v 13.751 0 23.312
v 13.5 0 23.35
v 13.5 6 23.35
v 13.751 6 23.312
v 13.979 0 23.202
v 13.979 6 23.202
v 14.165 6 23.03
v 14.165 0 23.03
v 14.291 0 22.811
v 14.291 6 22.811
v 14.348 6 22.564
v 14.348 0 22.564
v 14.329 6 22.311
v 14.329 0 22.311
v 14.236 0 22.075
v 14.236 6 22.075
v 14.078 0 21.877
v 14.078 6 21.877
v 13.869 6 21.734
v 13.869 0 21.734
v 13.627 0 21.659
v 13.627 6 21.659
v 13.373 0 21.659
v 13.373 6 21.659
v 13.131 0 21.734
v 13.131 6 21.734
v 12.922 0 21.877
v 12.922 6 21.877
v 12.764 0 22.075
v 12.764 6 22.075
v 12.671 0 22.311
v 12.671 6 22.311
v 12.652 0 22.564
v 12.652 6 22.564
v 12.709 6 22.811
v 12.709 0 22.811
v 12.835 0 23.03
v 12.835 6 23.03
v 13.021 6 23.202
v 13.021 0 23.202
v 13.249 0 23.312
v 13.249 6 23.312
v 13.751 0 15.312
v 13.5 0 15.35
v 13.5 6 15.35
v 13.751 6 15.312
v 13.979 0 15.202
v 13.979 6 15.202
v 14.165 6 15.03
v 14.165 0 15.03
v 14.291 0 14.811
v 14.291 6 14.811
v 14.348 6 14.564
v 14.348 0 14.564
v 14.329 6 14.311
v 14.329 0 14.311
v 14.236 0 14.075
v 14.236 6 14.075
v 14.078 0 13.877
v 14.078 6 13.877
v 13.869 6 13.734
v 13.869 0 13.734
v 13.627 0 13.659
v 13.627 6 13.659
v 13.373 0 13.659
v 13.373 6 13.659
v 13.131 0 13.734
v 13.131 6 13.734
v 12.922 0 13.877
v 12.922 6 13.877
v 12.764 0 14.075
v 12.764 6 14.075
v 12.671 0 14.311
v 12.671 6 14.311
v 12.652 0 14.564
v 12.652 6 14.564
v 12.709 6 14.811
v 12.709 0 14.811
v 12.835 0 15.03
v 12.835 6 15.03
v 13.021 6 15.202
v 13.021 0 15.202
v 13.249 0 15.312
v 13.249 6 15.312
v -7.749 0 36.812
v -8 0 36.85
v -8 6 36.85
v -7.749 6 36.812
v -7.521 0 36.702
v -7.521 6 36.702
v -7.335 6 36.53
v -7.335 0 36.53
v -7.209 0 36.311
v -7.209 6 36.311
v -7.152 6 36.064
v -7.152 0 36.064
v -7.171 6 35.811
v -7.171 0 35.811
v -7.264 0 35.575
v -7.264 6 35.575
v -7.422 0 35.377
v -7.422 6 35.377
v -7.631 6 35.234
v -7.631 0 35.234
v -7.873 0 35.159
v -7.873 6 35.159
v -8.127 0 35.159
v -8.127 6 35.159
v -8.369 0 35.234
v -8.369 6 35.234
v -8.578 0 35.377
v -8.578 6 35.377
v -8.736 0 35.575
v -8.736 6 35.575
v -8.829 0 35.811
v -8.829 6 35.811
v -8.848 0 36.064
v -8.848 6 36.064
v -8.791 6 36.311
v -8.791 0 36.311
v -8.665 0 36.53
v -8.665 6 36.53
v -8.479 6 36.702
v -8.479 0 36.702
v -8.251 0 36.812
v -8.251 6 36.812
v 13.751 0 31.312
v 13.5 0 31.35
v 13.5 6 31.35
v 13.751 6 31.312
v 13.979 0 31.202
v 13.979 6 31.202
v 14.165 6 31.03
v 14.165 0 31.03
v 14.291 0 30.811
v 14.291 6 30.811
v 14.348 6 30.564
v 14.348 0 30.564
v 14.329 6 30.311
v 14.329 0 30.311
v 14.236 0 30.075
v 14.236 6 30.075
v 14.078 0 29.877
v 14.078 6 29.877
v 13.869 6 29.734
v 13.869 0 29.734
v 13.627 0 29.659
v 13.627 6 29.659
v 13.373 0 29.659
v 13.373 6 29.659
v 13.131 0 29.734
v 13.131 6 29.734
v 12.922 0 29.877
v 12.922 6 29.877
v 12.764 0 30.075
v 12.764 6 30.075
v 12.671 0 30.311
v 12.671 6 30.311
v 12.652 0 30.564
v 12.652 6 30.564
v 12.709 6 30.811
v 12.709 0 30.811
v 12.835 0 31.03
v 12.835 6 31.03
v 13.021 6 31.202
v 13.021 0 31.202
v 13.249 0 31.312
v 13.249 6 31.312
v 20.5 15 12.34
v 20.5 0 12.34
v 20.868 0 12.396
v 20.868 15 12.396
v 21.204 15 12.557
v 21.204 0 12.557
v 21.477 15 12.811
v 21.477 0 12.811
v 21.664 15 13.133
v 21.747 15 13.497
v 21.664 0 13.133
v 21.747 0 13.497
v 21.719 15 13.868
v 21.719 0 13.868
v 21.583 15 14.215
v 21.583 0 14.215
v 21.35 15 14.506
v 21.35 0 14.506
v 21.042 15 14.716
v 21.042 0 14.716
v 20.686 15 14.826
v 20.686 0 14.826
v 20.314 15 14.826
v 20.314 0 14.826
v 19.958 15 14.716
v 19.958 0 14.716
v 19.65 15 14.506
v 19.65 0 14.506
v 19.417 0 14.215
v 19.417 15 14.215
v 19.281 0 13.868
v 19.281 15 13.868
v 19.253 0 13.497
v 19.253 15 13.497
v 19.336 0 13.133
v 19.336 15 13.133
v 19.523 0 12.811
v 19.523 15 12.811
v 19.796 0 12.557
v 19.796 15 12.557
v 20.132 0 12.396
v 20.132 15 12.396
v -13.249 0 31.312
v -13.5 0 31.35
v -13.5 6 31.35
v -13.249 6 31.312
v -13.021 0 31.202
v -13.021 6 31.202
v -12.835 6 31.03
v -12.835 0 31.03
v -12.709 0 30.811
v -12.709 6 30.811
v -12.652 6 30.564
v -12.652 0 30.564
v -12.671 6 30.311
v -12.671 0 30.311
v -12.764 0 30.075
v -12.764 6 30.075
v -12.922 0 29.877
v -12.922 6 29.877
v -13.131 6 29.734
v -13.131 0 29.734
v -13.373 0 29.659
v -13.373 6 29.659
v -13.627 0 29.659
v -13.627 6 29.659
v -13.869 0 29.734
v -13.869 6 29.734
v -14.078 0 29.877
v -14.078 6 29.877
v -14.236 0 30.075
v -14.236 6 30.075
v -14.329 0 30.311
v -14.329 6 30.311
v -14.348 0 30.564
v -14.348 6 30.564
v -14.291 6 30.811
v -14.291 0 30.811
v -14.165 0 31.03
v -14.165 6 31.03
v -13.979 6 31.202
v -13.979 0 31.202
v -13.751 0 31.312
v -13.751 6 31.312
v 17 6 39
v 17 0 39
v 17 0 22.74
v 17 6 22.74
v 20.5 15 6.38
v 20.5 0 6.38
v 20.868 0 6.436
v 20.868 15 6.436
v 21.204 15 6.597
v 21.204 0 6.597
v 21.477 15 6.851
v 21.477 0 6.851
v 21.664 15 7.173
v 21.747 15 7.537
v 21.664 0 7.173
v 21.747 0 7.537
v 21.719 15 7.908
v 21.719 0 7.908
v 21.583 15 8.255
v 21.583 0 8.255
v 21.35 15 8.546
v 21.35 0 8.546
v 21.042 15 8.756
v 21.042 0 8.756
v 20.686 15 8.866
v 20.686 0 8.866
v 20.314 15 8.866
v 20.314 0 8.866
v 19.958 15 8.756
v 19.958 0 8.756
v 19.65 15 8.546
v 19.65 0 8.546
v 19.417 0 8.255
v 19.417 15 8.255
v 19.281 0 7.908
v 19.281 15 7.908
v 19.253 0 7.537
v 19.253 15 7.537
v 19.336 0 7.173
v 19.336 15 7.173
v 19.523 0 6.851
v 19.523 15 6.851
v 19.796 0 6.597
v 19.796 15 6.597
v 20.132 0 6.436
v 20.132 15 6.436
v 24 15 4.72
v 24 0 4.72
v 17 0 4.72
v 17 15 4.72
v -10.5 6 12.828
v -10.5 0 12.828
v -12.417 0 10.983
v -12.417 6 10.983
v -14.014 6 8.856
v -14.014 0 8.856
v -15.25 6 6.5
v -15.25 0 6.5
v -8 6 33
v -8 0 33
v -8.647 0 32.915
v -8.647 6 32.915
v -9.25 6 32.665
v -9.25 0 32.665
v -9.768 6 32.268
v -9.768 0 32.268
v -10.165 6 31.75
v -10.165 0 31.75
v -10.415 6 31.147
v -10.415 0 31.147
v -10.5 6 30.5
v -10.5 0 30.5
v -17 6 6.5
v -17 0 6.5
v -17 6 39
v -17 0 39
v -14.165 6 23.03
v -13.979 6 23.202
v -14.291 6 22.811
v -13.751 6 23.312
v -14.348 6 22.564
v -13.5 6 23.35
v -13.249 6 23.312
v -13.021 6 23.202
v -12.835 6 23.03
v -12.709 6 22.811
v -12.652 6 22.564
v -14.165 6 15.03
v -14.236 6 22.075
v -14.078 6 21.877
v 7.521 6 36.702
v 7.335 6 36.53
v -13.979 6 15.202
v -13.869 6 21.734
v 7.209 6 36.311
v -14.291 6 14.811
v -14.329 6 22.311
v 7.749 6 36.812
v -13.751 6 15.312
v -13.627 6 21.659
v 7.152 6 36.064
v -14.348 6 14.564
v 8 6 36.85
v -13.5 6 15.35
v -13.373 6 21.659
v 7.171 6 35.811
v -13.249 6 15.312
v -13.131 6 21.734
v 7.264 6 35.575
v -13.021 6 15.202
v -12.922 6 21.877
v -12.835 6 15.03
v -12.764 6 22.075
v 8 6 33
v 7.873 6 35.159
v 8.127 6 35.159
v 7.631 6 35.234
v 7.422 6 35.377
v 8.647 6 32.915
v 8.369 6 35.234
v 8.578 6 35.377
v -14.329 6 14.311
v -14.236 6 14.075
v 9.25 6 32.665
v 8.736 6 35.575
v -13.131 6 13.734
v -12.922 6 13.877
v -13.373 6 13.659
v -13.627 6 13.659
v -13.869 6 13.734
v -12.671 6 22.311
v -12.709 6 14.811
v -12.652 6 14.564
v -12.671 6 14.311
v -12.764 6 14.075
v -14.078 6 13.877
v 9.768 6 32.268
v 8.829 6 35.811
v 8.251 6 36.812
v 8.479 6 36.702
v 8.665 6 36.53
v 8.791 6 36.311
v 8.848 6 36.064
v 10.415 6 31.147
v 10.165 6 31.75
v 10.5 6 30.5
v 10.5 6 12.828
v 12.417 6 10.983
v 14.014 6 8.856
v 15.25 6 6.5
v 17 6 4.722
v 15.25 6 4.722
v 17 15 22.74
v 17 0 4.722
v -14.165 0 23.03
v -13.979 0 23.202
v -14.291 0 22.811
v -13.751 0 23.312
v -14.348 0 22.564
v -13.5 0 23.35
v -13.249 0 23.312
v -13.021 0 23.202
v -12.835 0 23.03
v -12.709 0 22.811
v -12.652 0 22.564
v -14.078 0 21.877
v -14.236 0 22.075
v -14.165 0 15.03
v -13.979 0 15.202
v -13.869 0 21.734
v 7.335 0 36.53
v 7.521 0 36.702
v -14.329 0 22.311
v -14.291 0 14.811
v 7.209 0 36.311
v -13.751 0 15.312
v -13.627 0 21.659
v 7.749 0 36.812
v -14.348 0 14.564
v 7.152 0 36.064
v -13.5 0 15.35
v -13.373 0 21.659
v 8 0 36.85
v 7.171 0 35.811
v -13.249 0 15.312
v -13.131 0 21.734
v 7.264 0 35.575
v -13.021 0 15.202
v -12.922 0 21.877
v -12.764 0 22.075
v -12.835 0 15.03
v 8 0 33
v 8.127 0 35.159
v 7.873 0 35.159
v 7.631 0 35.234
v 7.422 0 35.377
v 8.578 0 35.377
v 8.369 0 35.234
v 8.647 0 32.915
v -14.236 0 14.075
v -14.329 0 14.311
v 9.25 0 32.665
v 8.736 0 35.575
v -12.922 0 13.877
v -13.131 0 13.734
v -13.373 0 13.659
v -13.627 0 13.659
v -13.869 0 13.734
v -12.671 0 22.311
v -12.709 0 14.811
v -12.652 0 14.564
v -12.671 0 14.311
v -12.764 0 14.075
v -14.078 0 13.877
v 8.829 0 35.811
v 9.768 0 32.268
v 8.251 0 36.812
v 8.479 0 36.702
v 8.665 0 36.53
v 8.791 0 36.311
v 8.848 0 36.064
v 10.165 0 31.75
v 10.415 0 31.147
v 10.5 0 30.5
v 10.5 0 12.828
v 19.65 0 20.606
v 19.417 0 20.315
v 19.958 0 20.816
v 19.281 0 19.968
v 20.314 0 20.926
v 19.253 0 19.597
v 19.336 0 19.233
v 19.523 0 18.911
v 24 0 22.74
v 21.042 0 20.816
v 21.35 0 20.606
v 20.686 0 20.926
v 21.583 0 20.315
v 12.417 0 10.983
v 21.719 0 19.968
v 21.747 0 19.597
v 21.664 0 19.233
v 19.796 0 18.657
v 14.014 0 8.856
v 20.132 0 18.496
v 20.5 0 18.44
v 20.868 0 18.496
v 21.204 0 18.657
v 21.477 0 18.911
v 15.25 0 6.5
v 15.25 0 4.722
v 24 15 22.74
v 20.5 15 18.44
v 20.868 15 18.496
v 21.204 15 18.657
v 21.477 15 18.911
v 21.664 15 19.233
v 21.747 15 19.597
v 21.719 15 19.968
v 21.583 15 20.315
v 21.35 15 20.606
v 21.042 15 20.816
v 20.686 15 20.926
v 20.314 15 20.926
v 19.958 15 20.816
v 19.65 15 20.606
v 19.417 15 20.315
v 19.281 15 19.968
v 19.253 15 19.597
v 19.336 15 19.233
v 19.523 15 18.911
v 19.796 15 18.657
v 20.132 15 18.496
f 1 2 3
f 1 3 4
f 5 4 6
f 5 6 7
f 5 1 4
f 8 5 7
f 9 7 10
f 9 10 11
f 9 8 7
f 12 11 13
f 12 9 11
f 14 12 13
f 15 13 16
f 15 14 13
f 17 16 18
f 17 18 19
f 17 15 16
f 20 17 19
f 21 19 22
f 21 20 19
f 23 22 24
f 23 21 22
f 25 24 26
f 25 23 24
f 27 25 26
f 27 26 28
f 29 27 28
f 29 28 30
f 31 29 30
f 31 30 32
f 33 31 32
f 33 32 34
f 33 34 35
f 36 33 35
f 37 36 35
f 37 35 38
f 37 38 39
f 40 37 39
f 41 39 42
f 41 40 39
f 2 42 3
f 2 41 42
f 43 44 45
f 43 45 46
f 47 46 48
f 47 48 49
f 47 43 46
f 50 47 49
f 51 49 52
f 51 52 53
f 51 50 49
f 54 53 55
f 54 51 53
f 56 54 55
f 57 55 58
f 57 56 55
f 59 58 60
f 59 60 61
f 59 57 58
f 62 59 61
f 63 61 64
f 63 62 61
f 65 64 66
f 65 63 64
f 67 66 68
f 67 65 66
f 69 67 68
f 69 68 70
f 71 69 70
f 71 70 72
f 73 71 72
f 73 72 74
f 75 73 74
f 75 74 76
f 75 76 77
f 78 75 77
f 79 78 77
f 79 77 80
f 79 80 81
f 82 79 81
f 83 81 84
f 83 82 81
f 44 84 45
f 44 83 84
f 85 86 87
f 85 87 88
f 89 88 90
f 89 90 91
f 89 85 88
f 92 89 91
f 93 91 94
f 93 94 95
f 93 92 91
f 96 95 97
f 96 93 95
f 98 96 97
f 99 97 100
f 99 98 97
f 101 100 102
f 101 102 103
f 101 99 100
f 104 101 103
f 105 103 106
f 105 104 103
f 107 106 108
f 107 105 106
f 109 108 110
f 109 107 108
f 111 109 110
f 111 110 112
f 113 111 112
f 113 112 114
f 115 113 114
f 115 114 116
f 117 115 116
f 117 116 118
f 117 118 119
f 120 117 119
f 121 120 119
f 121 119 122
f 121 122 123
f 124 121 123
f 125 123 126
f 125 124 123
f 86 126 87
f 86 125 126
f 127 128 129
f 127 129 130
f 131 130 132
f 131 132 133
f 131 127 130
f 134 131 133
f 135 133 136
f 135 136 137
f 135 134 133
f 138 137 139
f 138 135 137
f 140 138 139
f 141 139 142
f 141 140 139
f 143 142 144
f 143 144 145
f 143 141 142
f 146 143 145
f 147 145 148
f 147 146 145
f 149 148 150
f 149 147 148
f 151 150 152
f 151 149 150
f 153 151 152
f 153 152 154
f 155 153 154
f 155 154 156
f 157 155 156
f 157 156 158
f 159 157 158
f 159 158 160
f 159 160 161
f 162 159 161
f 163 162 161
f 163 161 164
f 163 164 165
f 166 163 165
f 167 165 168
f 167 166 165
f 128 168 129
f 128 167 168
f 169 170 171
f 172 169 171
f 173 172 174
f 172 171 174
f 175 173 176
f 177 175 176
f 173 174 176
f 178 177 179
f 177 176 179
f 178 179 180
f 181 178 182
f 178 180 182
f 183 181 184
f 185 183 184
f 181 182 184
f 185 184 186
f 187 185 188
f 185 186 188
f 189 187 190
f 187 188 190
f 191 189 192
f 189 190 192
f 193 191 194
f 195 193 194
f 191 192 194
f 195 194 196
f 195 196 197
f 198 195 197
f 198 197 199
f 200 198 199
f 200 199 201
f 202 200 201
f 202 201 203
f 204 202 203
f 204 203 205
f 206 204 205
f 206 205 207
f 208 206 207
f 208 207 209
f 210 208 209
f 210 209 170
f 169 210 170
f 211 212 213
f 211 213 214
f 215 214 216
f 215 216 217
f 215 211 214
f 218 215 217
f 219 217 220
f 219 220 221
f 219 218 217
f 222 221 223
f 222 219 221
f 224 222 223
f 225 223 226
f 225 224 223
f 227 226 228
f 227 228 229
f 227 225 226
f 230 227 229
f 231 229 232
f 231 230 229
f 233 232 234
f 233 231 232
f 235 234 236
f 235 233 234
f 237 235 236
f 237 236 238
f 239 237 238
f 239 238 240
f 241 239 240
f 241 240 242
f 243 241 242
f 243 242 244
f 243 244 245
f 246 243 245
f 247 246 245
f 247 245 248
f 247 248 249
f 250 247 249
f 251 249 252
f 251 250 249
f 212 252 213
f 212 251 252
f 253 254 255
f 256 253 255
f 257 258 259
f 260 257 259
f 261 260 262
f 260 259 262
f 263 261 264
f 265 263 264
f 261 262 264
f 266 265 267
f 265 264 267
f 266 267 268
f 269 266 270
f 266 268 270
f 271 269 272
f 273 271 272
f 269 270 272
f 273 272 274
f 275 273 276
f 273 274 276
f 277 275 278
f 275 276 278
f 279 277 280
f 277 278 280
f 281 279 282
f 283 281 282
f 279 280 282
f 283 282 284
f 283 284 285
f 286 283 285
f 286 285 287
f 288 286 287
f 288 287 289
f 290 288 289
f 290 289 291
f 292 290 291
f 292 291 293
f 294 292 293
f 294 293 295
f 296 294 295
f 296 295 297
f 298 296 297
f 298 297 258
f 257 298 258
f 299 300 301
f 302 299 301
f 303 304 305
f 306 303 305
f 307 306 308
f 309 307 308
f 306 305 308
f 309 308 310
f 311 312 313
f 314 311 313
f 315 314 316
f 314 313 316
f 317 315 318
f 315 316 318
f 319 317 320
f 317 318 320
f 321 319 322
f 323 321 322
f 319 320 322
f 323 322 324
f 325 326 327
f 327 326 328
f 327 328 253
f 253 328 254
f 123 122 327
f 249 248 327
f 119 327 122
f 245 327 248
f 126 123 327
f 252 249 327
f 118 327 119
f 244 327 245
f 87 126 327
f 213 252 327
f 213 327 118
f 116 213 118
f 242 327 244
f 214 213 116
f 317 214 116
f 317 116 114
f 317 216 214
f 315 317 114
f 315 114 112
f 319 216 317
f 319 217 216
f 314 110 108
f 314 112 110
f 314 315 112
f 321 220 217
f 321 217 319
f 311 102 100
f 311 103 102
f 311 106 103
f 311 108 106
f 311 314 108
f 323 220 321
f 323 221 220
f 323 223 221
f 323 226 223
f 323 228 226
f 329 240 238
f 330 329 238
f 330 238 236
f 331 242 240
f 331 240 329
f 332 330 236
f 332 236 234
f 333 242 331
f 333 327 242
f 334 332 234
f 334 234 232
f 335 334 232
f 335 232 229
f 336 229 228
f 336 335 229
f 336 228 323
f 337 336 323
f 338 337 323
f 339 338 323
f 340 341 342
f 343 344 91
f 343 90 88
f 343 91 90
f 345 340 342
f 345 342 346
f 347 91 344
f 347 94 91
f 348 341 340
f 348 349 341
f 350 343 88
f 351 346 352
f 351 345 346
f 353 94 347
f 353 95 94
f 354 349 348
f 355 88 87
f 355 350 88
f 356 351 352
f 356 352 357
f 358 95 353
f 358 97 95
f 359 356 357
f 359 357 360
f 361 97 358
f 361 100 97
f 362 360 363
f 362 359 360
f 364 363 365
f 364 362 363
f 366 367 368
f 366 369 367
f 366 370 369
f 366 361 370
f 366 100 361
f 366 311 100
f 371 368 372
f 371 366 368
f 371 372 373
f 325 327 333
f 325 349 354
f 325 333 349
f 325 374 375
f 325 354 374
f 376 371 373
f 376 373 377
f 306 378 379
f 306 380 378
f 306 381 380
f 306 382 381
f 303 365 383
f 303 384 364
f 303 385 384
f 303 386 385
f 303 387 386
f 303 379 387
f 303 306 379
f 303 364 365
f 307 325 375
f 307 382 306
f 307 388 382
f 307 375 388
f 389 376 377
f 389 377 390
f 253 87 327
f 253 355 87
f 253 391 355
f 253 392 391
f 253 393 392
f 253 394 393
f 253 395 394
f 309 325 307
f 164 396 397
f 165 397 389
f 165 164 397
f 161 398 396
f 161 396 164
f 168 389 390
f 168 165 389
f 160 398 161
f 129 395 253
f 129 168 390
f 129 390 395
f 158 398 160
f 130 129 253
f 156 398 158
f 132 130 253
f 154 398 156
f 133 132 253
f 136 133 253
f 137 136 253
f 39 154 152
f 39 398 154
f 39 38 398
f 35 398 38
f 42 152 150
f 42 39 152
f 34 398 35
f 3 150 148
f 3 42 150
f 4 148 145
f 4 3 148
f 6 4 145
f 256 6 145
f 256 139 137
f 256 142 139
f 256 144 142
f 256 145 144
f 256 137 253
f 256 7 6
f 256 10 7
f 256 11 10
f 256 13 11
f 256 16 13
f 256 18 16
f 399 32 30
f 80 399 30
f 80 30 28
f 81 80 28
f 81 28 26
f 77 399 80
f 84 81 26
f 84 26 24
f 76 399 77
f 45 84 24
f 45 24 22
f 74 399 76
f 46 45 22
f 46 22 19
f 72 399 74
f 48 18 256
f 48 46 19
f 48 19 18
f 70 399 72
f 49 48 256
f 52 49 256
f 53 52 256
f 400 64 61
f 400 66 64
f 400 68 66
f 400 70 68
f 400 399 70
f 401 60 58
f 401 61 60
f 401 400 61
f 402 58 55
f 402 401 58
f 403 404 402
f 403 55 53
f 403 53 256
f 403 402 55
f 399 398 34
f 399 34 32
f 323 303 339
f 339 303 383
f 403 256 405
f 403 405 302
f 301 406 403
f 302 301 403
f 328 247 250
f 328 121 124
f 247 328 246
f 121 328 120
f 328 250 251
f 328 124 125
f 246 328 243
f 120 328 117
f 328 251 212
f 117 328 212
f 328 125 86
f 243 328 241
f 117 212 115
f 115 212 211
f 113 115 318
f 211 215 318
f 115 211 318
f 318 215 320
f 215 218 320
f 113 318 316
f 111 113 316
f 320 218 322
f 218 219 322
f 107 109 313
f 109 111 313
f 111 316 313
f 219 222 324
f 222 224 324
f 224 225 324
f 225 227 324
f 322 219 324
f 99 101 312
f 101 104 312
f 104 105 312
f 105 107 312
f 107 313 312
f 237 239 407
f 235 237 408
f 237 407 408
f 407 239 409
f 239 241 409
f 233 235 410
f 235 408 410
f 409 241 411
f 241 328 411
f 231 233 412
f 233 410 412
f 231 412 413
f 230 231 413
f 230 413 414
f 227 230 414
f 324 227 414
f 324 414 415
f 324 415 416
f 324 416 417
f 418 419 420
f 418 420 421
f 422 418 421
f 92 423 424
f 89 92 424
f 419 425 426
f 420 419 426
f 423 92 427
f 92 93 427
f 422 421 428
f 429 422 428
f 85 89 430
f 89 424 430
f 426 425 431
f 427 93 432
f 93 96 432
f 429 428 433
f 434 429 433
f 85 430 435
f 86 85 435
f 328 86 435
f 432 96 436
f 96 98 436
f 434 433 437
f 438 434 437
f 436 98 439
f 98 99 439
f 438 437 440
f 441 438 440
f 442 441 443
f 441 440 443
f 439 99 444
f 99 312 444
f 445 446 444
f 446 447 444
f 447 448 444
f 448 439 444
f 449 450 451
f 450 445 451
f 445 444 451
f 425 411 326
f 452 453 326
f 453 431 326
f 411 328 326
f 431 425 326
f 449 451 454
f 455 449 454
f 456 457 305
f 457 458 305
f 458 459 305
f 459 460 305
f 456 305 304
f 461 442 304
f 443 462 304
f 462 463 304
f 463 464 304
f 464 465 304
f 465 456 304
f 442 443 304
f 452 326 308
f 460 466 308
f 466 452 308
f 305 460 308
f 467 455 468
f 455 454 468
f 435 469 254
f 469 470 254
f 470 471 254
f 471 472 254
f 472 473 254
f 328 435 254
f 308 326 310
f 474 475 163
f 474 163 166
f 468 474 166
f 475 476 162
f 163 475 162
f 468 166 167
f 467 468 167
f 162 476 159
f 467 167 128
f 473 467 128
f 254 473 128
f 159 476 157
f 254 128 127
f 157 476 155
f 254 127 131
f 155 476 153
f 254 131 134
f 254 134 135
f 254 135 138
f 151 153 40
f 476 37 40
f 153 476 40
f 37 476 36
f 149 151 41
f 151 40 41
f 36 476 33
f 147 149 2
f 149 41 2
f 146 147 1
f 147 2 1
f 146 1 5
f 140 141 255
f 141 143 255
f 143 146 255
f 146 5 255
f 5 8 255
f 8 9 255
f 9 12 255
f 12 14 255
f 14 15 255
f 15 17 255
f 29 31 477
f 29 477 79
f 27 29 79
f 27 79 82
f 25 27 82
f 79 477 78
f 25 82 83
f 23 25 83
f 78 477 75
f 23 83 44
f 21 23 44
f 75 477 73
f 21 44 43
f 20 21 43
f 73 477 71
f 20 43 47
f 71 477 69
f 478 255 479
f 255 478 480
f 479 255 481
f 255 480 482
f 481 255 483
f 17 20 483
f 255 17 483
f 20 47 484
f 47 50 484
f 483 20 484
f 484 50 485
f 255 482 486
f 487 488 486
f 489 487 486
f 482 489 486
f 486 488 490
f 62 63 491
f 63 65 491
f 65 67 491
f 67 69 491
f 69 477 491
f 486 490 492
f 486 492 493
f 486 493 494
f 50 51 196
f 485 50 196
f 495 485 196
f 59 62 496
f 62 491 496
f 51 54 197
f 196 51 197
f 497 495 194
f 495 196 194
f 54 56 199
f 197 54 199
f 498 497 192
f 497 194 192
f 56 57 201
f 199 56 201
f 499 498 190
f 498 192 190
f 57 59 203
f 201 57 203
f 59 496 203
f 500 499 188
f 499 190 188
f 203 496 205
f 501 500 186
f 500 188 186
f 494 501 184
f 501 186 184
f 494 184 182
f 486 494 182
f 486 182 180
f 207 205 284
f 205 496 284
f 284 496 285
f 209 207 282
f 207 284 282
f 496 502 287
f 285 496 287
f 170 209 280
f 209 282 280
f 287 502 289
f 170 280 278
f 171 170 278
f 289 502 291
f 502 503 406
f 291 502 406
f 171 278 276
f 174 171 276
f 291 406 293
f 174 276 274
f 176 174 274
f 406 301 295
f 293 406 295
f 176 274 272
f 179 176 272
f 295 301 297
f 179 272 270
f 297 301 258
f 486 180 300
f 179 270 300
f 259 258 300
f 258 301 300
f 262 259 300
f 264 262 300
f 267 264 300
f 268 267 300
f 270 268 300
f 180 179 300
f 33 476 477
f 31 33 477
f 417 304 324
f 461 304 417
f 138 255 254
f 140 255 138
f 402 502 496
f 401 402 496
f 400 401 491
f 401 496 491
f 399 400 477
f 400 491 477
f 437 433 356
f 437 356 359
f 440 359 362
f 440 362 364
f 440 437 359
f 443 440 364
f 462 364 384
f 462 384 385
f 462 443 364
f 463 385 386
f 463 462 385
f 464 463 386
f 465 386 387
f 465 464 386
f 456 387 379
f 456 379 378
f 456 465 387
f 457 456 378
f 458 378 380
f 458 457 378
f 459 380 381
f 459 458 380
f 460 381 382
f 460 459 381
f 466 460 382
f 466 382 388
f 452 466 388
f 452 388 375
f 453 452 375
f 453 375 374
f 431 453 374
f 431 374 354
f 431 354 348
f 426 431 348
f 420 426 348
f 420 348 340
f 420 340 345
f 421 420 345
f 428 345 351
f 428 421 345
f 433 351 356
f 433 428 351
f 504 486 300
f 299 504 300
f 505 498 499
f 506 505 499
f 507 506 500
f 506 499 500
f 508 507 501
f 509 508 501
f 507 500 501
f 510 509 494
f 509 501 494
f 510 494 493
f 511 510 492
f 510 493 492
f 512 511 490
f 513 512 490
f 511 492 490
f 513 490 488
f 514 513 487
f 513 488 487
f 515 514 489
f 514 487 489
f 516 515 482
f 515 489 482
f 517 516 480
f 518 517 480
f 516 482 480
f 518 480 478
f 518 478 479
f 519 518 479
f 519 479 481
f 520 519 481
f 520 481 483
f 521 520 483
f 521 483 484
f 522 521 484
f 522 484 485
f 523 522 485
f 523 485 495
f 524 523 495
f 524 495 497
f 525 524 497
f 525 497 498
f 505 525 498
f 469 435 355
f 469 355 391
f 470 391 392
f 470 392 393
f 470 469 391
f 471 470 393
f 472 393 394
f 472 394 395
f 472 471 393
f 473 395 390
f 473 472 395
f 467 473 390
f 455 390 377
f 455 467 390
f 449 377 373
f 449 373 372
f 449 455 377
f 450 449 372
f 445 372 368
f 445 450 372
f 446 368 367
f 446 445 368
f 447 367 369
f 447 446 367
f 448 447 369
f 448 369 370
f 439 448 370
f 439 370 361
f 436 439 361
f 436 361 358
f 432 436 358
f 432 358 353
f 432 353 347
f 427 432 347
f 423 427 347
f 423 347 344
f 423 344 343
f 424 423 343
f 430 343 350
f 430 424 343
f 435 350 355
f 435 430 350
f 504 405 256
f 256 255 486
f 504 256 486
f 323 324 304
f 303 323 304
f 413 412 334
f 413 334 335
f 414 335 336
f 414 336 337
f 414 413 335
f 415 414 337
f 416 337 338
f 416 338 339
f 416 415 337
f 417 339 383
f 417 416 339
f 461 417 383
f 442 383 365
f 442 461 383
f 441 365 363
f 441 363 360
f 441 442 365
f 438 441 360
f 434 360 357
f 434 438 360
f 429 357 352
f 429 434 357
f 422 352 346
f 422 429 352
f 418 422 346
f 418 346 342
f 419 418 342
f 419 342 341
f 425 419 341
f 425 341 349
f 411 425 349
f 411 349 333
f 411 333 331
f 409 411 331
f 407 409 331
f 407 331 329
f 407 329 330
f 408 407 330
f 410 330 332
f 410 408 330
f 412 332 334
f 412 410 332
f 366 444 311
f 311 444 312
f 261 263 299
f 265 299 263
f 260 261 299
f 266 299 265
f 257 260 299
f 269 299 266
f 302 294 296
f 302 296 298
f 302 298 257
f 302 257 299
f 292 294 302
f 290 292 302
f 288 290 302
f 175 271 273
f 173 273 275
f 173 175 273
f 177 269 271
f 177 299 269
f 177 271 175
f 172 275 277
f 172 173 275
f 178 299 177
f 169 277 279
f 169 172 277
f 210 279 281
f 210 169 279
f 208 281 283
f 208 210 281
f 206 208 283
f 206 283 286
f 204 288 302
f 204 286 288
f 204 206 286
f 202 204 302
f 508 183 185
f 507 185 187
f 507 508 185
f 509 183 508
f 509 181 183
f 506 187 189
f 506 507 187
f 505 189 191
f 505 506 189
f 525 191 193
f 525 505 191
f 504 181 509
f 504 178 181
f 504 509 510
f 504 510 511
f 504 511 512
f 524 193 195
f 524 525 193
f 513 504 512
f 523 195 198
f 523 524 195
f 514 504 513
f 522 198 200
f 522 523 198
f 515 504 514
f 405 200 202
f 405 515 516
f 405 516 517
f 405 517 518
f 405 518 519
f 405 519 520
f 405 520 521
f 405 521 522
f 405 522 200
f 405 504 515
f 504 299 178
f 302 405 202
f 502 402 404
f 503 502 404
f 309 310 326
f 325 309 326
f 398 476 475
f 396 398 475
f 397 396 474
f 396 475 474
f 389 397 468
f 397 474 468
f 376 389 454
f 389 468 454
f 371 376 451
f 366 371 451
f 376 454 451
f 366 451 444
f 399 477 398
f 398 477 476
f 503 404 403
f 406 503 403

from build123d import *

# Parameters (mm, degrees)
SKETCH1_R           = 0.85
BOSS_EXTRUDE1_DEPTH = 6
BOSS_EXTRUDE2_DEPTH = 15
SKETCH4_R           = 1.25
CUT_EXTRUDE2_DEPTH  = 49.187135213
CUT_EXTRUDE3_DEPTH  = 10
SKETCH7_W           = 1.75
SKETCH7_H           = 1.777688456
BOSS_EXTRUDE4_DEPTH = 6


with BuildPart() as part:
    # Sketch1 → Boss-Extrude1 (new body)
    with BuildSketch(Plane(origin=(0, 0, 0), x_dir=(1, 0, 0), z_dir=(0, 1, 0))):
        with BuildLine():
            Line((-17, -6.5), (-17, -33.5))
            Line((-17, -33.5), (-17, -39))
            Line((-17, -39), (17, -39))
            Line((17, -39), (17, -33.5))
            Line((17, -33.5), (17, -6.5))
            Line((17, -6.5), (15.25, -6.5))
            ThreePointArc((15.25, -6.5), (13.258096668, -9.951651759), (10.5, -12.828191611))
            Line((10.5, -12.828191611), (10.5, -30.5))
            Line((10.5, -30.5), (8, -30.5))
            Line((8, -30.5), (8, -33))
            Line((8, -33), (-8, -33))
            Line((-8, -33), (-8, -30.5))
            Line((-8, -30.5), (-10.5, -30.5))
            Line((-10.5, -30.5), (-10.5, -12.828191611))
            ThreePointArc((-10.5, -12.828191611), (-13.258096668, -9.951651759), (-15.25, -6.5))
            Line((-15.25, -6.5), (-17, -6.5))
        make_face()
        with Locations(Location((-13.5, -30.5, 0), (0, 0, 270))):
            Circle(SKETCH1_R, mode=Mode.SUBTRACT)
        with Locations(Location((-13.5, -22.5, 0), (0, 0, 270))):
            Circle(SKETCH1_R, mode=Mode.SUBTRACT)
        with Locations(Location((-13.5, -14.5, 0), (0, 0, 270))):
            Circle(SKETCH1_R, mode=Mode.SUBTRACT)
        with Locations(Location((-8, -36, 0), (0, 0, 270))):
            Circle(SKETCH1_R, mode=Mode.SUBTRACT)
        with Locations(Location((8, -36, 0), (0, 0, 270))):
            Circle(SKETCH1_R, mode=Mode.SUBTRACT)
        with Locations(Location((13.5, -30.5, 0), (0, 0, 270))):
            Circle(SKETCH1_R, mode=Mode.SUBTRACT)
        with Locations(Location((13.5, -22.5, 0), (0, 0, 270))):
            Circle(SKETCH1_R, mode=Mode.SUBTRACT)
        with Locations(Location((13.5, -14.5, 0), (0, 0, 270))):
            Circle(SKETCH1_R, mode=Mode.SUBTRACT)
    extrude(amount=BOSS_EXTRUDE1_DEPTH)

    # Sketch3 → Boss-Extrude2 (add)
    with BuildSketch(Plane.XZ):
        Polygon((17, 22.74), (24, 22.74), (24, 4.72), (17, 4.72), (17, 7.901808389), align=None)
    extrude(amount=-BOSS_EXTRUDE2_DEPTH)

    # Sketch4 → Cut-Extrude2 (cut, through all)
    with BuildSketch(Plane.XZ):
        with Locations(Location((20.5, 7.63, 0), (0, 0, 270))):
            Circle(SKETCH4_R)
        with Locations(Location((20.5, 13.59, 0), (0, 0, 270))):
            Circle(SKETCH4_R)
        with Locations(Location((20.5, 19.69, 0), (0, 0, 270))):
            Circle(SKETCH4_R)
    extrude(amount=-CUT_EXTRUDE2_DEPTH, mode=Mode.SUBTRACT)

    # Sketch5 → Cut-Extrude3 (cut)
    with BuildSketch(Plane.XZ):
        with BuildLine():
            Line((8, 33), (-8, 33))
            ThreePointArc((-8, 33), (-9.767766953, 32.267766953), (-10.5, 30.5))
            Line((-10.5, 30.5), (10.5, 30.5))
            ThreePointArc((10.5, 30.5), (9.767766953, 32.267766953), (8, 33))
        make_face()
    extrude(amount=-CUT_EXTRUDE3_DEPTH, mode=Mode.SUBTRACT)

    # Sketch7 → Boss-Extrude4 (add)
    with BuildSketch(Plane(origin=(0, 6, 0), x_dir=(1, 0, 0), z_dir=(0, 1, 0))):
        with Locations((16.125, -5.611155772)):
            Rectangle(SKETCH7_W, SKETCH7_H)
    extrude(amount=-BOSS_EXTRUDE4_DEPTH)


solid = part.part
